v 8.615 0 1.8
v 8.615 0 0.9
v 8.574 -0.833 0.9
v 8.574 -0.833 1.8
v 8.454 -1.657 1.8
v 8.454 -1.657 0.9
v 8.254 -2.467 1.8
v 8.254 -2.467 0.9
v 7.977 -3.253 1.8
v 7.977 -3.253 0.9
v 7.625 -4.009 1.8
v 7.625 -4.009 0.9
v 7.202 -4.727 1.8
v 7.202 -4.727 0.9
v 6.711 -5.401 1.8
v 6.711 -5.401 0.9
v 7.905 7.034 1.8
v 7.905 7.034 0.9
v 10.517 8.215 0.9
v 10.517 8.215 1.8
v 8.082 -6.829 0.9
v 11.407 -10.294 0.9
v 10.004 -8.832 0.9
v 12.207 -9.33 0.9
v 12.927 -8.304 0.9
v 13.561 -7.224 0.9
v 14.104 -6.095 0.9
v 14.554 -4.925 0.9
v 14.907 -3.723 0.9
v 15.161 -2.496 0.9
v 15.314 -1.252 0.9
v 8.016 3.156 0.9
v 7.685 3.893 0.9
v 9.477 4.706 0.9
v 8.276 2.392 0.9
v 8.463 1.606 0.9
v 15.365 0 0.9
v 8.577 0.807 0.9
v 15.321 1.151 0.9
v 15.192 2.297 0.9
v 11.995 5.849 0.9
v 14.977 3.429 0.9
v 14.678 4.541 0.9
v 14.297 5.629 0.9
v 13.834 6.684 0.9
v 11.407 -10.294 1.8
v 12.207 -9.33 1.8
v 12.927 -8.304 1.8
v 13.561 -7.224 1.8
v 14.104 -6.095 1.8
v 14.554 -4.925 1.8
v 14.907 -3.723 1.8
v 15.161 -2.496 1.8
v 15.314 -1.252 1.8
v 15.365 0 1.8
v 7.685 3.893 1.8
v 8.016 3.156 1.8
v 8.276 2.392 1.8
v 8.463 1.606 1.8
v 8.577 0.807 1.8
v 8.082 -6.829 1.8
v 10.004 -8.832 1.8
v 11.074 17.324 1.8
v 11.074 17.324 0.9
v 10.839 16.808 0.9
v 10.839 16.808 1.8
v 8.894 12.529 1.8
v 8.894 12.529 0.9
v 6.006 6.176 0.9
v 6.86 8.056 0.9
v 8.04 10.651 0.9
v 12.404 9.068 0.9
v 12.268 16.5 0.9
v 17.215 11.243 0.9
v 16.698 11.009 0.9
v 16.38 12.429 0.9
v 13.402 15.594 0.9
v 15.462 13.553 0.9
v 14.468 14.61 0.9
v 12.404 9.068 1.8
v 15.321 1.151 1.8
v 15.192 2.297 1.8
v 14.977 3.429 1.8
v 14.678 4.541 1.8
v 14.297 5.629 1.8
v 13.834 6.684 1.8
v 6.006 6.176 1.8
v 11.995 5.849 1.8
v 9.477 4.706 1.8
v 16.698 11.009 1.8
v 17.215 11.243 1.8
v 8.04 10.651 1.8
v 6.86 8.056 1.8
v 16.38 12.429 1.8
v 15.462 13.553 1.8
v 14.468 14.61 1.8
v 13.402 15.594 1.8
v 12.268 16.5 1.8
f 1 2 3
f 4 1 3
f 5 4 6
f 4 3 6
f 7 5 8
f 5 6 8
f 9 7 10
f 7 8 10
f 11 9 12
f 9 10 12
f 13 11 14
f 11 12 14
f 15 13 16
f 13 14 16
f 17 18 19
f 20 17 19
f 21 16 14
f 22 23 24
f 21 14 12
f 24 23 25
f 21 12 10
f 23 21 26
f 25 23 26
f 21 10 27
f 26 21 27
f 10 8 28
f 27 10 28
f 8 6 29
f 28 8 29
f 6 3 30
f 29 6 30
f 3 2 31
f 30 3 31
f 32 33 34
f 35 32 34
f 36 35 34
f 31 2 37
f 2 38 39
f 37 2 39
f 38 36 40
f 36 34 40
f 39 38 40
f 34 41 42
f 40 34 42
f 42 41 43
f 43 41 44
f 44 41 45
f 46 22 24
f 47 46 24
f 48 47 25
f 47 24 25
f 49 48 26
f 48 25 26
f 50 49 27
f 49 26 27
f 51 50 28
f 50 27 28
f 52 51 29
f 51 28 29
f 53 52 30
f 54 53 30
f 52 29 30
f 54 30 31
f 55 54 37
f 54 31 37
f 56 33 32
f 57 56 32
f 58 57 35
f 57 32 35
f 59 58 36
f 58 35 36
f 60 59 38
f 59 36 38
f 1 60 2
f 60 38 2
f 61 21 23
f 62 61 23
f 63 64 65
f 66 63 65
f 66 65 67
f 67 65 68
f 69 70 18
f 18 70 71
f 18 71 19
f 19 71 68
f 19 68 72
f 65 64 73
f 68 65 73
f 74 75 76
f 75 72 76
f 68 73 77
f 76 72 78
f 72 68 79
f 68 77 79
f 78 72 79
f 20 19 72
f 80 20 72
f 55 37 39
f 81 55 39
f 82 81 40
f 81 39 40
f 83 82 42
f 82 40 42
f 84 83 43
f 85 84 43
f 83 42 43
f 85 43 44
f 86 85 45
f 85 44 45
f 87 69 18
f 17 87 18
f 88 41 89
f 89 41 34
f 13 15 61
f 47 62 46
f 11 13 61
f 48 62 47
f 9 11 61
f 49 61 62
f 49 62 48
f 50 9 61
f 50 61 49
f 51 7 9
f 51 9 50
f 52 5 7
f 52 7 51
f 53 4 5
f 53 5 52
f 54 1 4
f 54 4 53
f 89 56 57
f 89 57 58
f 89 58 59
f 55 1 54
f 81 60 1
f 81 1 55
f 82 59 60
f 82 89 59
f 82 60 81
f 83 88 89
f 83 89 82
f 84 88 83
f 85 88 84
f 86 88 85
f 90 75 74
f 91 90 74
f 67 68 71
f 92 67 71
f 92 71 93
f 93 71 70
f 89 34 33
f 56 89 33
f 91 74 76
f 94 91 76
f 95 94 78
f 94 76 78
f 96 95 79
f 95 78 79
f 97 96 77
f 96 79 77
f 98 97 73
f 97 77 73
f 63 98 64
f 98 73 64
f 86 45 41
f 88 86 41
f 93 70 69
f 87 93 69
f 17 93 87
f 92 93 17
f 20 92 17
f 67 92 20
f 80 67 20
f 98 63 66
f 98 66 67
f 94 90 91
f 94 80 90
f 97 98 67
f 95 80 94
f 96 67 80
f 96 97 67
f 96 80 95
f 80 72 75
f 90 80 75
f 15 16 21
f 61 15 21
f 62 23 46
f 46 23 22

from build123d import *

# Parameters (mm, degrees)
F0_R        = 1.5044645314
F1_DEPTH    = 2.7
F2_DEPTH    = 0.9
F3_DEPTH    = 2.7
F4_DEPTH    = 0.9
F5_T1_DEPTH = 2.7
F6_DEPTH    = 0.9


# Not quite as in the source:
# - a fillet or chamfer that OpenCascade refuses, or shapes differently, is made with other operations: its cross-section is extruded or revolved along the edge and cut away or added


with BuildPart() as f1:
    # F0 (on Top) → F1 (new body)
    with BuildSketch(Plane.XY):
        with BuildLine():
            ThreePointArc((-2.9059050305, 19.7877668258), (-18.361479671, -7.928181651), (12.4102011034, -15.6839697964))
            Line((12.4102011034, -15.6839697964), (9.3065271924, -12.2254227754))
            ThreePointArc((9.3065271924, -12.2254227754), (-15.2699304913, -1.7034180964), (6.3836906961, 13.9757255095))
            Line((6.3836906961, 13.9757255095), (8.1864677167, 18.2477874364))
            ThreePointArc((8.1864677167, 18.2477874364), (5.5993809855, 19.2001805351), (2.9059050305, 19.7877668258))
            ThreePointArc((2.9059050305, 19.7877668258), (0, 18.1241204417), (-2.9059050305, 19.7877668258))
        make_face()
        with BuildLine():
            ThreePointArc((6.3836906961, 13.9757255095), (-15.2699304913, -1.7034180964), (9.3065271924, -12.2254227754))
            Line((9.3065271924, -12.2254227754), (7.9527661976, -10.7168731694))
            ThreePointArc((7.9527661976, -10.7168731694), (-13.2749249311, -1.3690247612), (5.5982117915, 12.114366903))
            Line((5.5982117915, 12.114366903), (6.3836906961, 13.9757255095))
        make_face()
        with BuildLine():
            ThreePointArc((5.5982117915, 12.114366903), (-13.2749249311, -1.3690247612), (7.9527661976, -10.7168731694))
            Line((7.9527661976, -10.7168731694), (6.0964799797, -8.6483397626))
            ThreePointArc((6.0964799797, -8.6483397626), (-10.5418803683, -0.9108276969), (4.5227579261, 9.5658512185))
            Line((4.5227579261, 9.5658512185), (5.5982117915, 12.114366903))
        make_face()
        with BuildLine():
            ThreePointArc((4.5227579261, 9.5658512185), (-10.5418803683, -0.9108276969), (6.0964799797, -8.6483397626))
            Line((6.0964799797, -8.6483397626), (4.7718042528, -7.1722010249))
            ThreePointArc((4.7718042528, -7.1722010249), (-8.5947223482, -0.5842355063), (3.7573171653, 7.7519772374))
            Line((3.7573171653, 7.7519772374), (4.5227579261, 9.5658512185))
        make_face()
        with BuildLine():
            ThreePointArc((3.7573171653, 7.7519772374), (-8.5947223482, -0.5842355063), (4.7718042528, -7.1722010249))
            Line((4.7718042528, -7.1722010249), (1.6593857385, -3.7039095455))
            ThreePointArc((1.6593857385, -3.7039095455), (-4.0546444127, 0.1799045205), (1.9809039535, 3.5423899386))
            Line((1.9809039535, 3.5423899386), (3.7573171653, 7.7519772374))
        make_face()
        with BuildLine():
            ThreePointArc((2.9059050305, 19.7877668258), (0, 20), (-2.9059050305, 19.7877668258))
            ThreePointArc((-2.9059050305, 19.7877668258), (0, 18.1241204417), (2.9059050305, 19.7877668258))
        make_face()
        with BuildLine():
            ThreePointArc((-3.157685128, 20.3174125427), (-3.043339046, 20.0471019762), (-2.9059050305, 19.7877668258))
            ThreePointArc((-2.9059050305, 19.7877668258), (0, 20), (2.9059050305, 19.7877668258))
            ThreePointArc((2.9059050305, 19.7877668258), (3.043339046, 20.0471019762), (3.157685128, 20.3174125427))
            ThreePointArc((3.157685128, 20.3174125427), (0, 20.5613284541), (-3.157685128, 20.3174125427))
        make_face()
        with BuildLine():
            ThreePointArc((3.3697074825, 21.4938279241), (-0.5976844127, 24.8101062388), (-3.157685128, 20.3174125427))
            ThreePointArc((-3.157685128, 20.3174125427), (0, 20.5613284541), (3.157685128, 20.3174125427))
            ThreePointArc((3.157685128, 20.3174125427), (3.3162783146, 20.8961435115), (3.3697074825, 21.4938279241))
        make_face()
        with Locations((0, 22.4330537021)):
            Circle(F0_R, mode=Mode.SUBTRACT)
        with BuildLine():
            ThreePointArc((13.8344540426, 6.6843318112), (13.1730545976, 7.9084159596), (12.4036340143, 9.0676498421))
            Line((12.4036340143, 9.0676498421), (10.5172175152, 8.21498609))
            ThreePointArc((10.5172175152, 8.21498609), (11.318131065, 7.0709101194), (11.995098321, 5.8493997121))
            Line((11.995098321, 5.8493997121), (13.8344540426, 6.6843318112))
        make_face()
        with BuildLine():
            ThreePointArc((11.995098321, 5.8493997121), (11.318131065, 7.0709101194), (10.5172175152, 8.21498609))
            Line((10.5172175152, 8.21498609), (7.9045951482, 7.0340759404))
            ThreePointArc((7.9045951482, 7.0340759404), (8.7683299388, 5.9226040621), (9.4768887451, 4.706317935))
            Line((9.4768887451, 4.706317935), (11.995098321, 5.8493997121))
        make_face()
        with BuildLine():
            ThreePointArc((9.4768887451, 4.706317935), (8.7683299388, 5.9226040621), (7.9045951482, 7.0340759404))
            Line((7.9045951482, 7.0340759404), (6.0058132946, 6.1758230253))
            ThreePointArc((6.0058132946, 6.1758230253), (6.9398340598, 5.1038501734), (7.6848114732, 3.8928467719))
            Line((7.6848114732, 3.8928467719), (9.4768887451, 4.706317935))
        make_face()
        with BuildLine():
            Line((6.0058132946, 6.1758230253), (7.9045951482, 7.0340759404))
            ThreePointArc((7.9045951482, 7.0340759404), (7.4001814409, 7.5629467428), (6.8604632985, 8.0557365971))
            Line((6.8604632985, 8.0557365971), (6.0058132946, 6.1758230253))
        make_face()
        with BuildLine():
            ThreePointArc((6.8604632985, 8.0557365971), (5.7414756731, 8.8879866049), (4.5227579261, 9.5658512185))
            Line((4.5227579261, 9.5658512185), (3.7573171653, 7.7519772374))
            ThreePointArc((3.7573171653, 7.7519772374), (4.9447694202, 7.0540654058), (6.0058132946, 6.1758230253))
            Line((6.0058132946, 6.1758230253), (6.8604632985, 8.0557365971))
        make_face()
        with BuildLine():
            ThreePointArc((8.0404414582, 10.6512516579), (6.8584540657, 11.4481207432), (5.5982117915, 12.114366903))
            Line((5.5982117915, 12.114366903), (4.5227579261, 9.5658512185))
            ThreePointArc((4.5227579261, 9.5658512185), (5.7414756731, 8.8879866049), (6.8604632985, 8.0557365971))
            Line((6.8604632985, 8.0557365971), (8.0404414582, 10.6512516579))
        make_face()
        with BuildLine():
            ThreePointArc((8.8939895289, 12.5287413845), (7.6730254156, 13.3115397829), (6.3836906961, 13.9757255095))
            Line((6.3836906961, 13.9757255095), (5.5982117915, 12.114366903))
            ThreePointArc((5.5982117915, 12.114366903), (6.8584540657, 11.4481207432), (8.0404414582, 10.6512516579))
            Line((8.0404414582, 10.6512516579), (8.8939895289, 12.5287413845))
        make_face()
        with BuildLine():
            Line((7.9045951482, 7.0340759404), (10.5172175152, 8.21498609))
            ThreePointArc((10.5172175152, 8.21498609), (9.3584466725, 9.514059943), (8.0404414582, 10.6512516579))
            Line((8.0404414582, 10.6512516579), (6.8604632985, 8.0557365971))
            ThreePointArc((6.8604632985, 8.0557365971), (7.4001814409, 7.5629467428), (7.9045951482, 7.0340759404))
        make_face()
        with BuildLine():
            Line((10.5172175152, 8.21498609), (12.4036340143, 9.0676498421))
            ThreePointArc((12.4036340143, 9.0676498421), (10.7885115198, 10.9398550999), (8.8939895289, 12.5287413845))
            Line((8.8939895289, 12.5287413845), (8.0404414582, 10.6512516579))
            ThreePointArc((8.0404414582, 10.6512516579), (9.3584466725, 9.514059943), (10.5172175152, 8.21498609))
        make_face()
        with BuildLine():
            Line((12.4036340143, 9.0676498421), (16.6976556484, 11.008555575))
            ThreePointArc((16.6976556484, 11.008555575), (14.070563524, 14.2133473227), (10.8394114429, 16.807949297))
            Line((10.8394114429, 16.807949297), (8.8939895289, 12.5287413845))
            ThreePointArc((8.8939895289, 12.5287413845), (10.7885115198, 10.9398550999), (12.4036340143, 9.0676498421))
        make_face()
        with BuildLine():
            ThreePointArc((10.8394114429, 16.807949297), (14.070563524, 14.2133473227), (16.6976556484, 11.008555575))
            Line((16.6976556484, 11.008555575), (17.2154603994, 11.2426042817))
            ThreePointArc((17.2154603994, 11.2426042817), (14.4679762691, 14.6097874889), (11.0741551061, 17.3242984413))
            Line((11.0741551061, 17.3242984413), (10.8394114429, 16.807949297))
        make_face()
    extrude(amount=-F1_DEPTH)

    # F0 (on Top) → F2 (join)
    with BuildSketch(Plane.XY):
        with BuildLine():
            ThreePointArc((-2.9059050305, 19.7877668258), (-18.361479671, -7.928181651), (12.4102011034, -15.6839697964))
            Line((12.4102011034, -15.6839697964), (9.3065271924, -12.2254227754))
            ThreePointArc((9.3065271924, -12.2254227754), (-15.2699304913, -1.7034180964), (6.3836906961, 13.9757255095))
            Line((6.3836906961, 13.9757255095), (8.1864677167, 18.2477874364))
            ThreePointArc((8.1864677167, 18.2477874364), (5.5993809855, 19.2001805351), (2.9059050305, 19.7877668258))
            ThreePointArc((2.9059050305, 19.7877668258), (0, 18.1241204417), (-2.9059050305, 19.7877668258))
        make_face()
        with BuildLine():
            ThreePointArc((6.3836906961, 13.9757255095), (-15.2699304913, -1.7034180964), (9.3065271924, -12.2254227754))
            Line((9.3065271924, -12.2254227754), (7.9527661976, -10.7168731694))
            ThreePointArc((7.9527661976, -10.7168731694), (-13.2749249311, -1.3690247612), (5.5982117915, 12.114366903))
            Line((5.5982117915, 12.114366903), (6.3836906961, 13.9757255095))
        make_face()
        with BuildLine():
            ThreePointArc((4.5227579261, 9.5658512185), (-10.5418803683, -0.9108276969), (6.0964799797, -8.6483397626))
            Line((6.0964799797, -8.6483397626), (4.7718042528, -7.1722010249))
            ThreePointArc((4.7718042528, -7.1722010249), (-8.5947223482, -0.5842355063), (3.7573171653, 7.7519772374))
            Line((3.7573171653, 7.7519772374), (4.5227579261, 9.5658512185))
        make_face()
        with BuildLine():
            ThreePointArc((3.7573171653, 7.7519772374), (-8.5947223482, -0.5842355063), (4.7718042528, -7.1722010249))
            Line((4.7718042528, -7.1722010249), (1.6593857385, -3.7039095455))
            ThreePointArc((1.6593857385, -3.7039095455), (-4.0546444127, 0.1799045205), (1.9809039535, 3.5423899386))
            Line((1.9809039535, 3.5423899386), (3.7573171653, 7.7519772374))
        make_face()
        with BuildLine():
            ThreePointArc((2.9059050305, 19.7877668258), (0, 20), (-2.9059050305, 19.7877668258))
            ThreePointArc((-2.9059050305, 19.7877668258), (0, 18.1241204417), (2.9059050305, 19.7877668258))
        make_face()
    extrude(amount=F2_DEPTH)

    # F0 (on Top) → F3 (join)
    with BuildSketch(Plane.XY):
        with BuildLine():
            Line((6.7113864418, -5.4007291543), (8.0821585416, -6.8293163715))
            ThreePointArc((8.0821585416, -6.8293163715), (9.9367857977, -3.6360881181), (10.5811553619, 0))
            ThreePointArc((10.5811553619, 0), (10.3013902205, 2.4170660555), (9.4768887451, 4.706317935))
            Line((9.4768887451, 4.706317935), (7.6848114732, 3.8928467719))
            ThreePointArc((7.6848114732, 3.8928467719), (8.3788968801, 2.00116727), (8.6145564813, 0))
            ThreePointArc((8.6145564813, 0), (8.1248446428, -2.8631246741), (6.7113864418, -5.4007291543))
        make_face()
        with BuildLine():
            Line((8.0821585416, -6.8293163715), (10.0042554899, -8.8324816906))
            ThreePointArc((10.0042554899, -8.8324816906), (12.4821464921, -4.721639511), (13.3453310458, 0))
            ThreePointArc((13.3453310458, 0), (13.0033922255, 3.0016081275), (11.995098321, 5.8493997121))
            Line((11.995098321, 5.8493997121), (9.4768887451, 4.706317935))
            ThreePointArc((9.4768887451, 4.706317935), (10.3013902205, 2.4170660555), (10.5811553619, 0))
            ThreePointArc((10.5811553619, 0), (9.9367857977, -3.6360881181), (8.0821585416, -6.8293163715))
        make_face()
        with BuildLine():
            Line((10.0042554899, -8.8324816906), (11.4065098197, -10.2938789654))
            ThreePointArc((11.4065098197, -10.2938789654), (14.3410149492, -5.5143177862), (15.3646480734, 0))
            ThreePointArc((15.3646480734, 0), (14.9772148291, 3.4286216448), (13.8344540426, 6.6843318112))
            Line((13.8344540426, 6.6843318112), (11.995098321, 5.8493997121))
            ThreePointArc((11.995098321, 5.8493997121), (13.0033922255, 3.0016081275), (13.3453310458, 0))
            ThreePointArc((13.3453310458, 0), (12.4821464921, -4.721639511), (10.0042554899, -8.8324816906))
        make_face()
        with BuildLine():
            Line((7.9527661976, -10.7168731694), (9.3065271924, -12.2254227754))
            ThreePointArc((9.3065271924, -12.2254227754), (10.4014513861, -11.3085020883), (11.4065098197, -10.2938789654))
            Line((11.4065098197, -10.2938789654), (10.0042554899, -8.8324816906))
            ThreePointArc((10.0042554899, -8.8324816906), (9.0278120152, -9.8283503672), (7.9527661976, -10.7168731694))
        make_face()
        with BuildLine():
            Line((6.0964799797, -8.6483397626), (7.9527661976, -10.7168731694))
            ThreePointArc((7.9527661976, -10.7168731694), (9.0278120152, -9.8283503672), (10.0042554899, -8.8324816906))
            Line((10.0042554899, -8.8324816906), (8.0821585416, -6.8293163715))
            ThreePointArc((8.0821585416, -6.8293163715), (7.1474232492, -7.8022554232), (6.0964799797, -8.6483397626))
        make_face()
        with BuildLine():
            Line((4.7718042528, -7.1722010249), (6.0964799797, -8.6483397626))
            ThreePointArc((6.0964799797, -8.6483397626), (7.1474232492, -7.8022554232), (8.0821585416, -6.8293163715))
            Line((8.0821585416, -6.8293163715), (6.7113864418, -5.4007291543))
            ThreePointArc((6.7113864418, -5.4007291543), (5.8095133427, -6.3608284122), (4.7718042528, -7.1722010249))
        make_face()
    extrude(amount=-F3_DEPTH)

    # F0 (on Top) → F4 (join)
    with BuildSketch(Plane.XY):
        with BuildLine():
            Line((10.0042554899, -8.8324816906), (11.4065098197, -10.2938789654))
            ThreePointArc((11.4065098197, -10.2938789654), (14.3410149492, -5.5143177862), (15.3646480734, 0))
            ThreePointArc((15.3646480734, 0), (14.9772148291, 3.4286216448), (13.8344540426, 6.6843318112))
            Line((13.8344540426, 6.6843318112), (11.995098321, 5.8493997121))
            ThreePointArc((11.995098321, 5.8493997121), (13.0033922255, 3.0016081275), (13.3453310458, 0))
            ThreePointArc((13.3453310458, 0), (12.4821464921, -4.721639511), (10.0042554899, -8.8324816906))
        make_face()
        with BuildLine():
            Line((8.0821585416, -6.8293163715), (10.0042554899, -8.8324816906))
            ThreePointArc((10.0042554899, -8.8324816906), (12.4821464921, -4.721639511), (13.3453310458, 0))
            ThreePointArc((13.3453310458, 0), (13.0033922255, 3.0016081275), (11.995098321, 5.8493997121))
            Line((11.995098321, 5.8493997121), (9.4768887451, 4.706317935))
            ThreePointArc((9.4768887451, 4.706317935), (10.3013902205, 2.4170660555), (10.5811553619, 0))
            ThreePointArc((10.5811553619, 0), (9.9367857977, -3.6360881181), (8.0821585416, -6.8293163715))
        make_face()
        with BuildLine():
            Line((6.7113864418, -5.4007291543), (8.0821585416, -6.8293163715))
            ThreePointArc((8.0821585416, -6.8293163715), (9.9367857977, -3.6360881181), (10.5811553619, 0))
            ThreePointArc((10.5811553619, 0), (10.3013902205, 2.4170660555), (9.4768887451, 4.706317935))
            Line((9.4768887451, 4.706317935), (7.6848114732, 3.8928467719))
            ThreePointArc((7.6848114732, 3.8928467719), (8.3788968801, 2.00116727), (8.6145564813, 0))
            ThreePointArc((8.6145564813, 0), (8.1248446428, -2.8631246741), (6.7113864418, -5.4007291543))
        make_face()
        with BuildLine():
            ThreePointArc((10.8394114429, 16.807949297), (14.070563524, 14.2133473227), (16.6976556484, 11.008555575))
            Line((16.6976556484, 11.008555575), (17.2154603994, 11.2426042817))
            ThreePointArc((17.2154603994, 11.2426042817), (14.4679762691, 14.6097874889), (11.0741551061, 17.3242984413))
            Line((11.0741551061, 17.3242984413), (10.8394114429, 16.807949297))
        make_face()
        with BuildLine():
            Line((6.0058132946, 6.1758230253), (7.9045951482, 7.0340759404))
            ThreePointArc((7.9045951482, 7.0340759404), (7.4001814409, 7.5629467428), (6.8604632985, 8.0557365971))
            Line((6.8604632985, 8.0557365971), (6.0058132946, 6.1758230253))
        make_face()
        with BuildLine():
            Line((7.9045951482, 7.0340759404), (10.5172175152, 8.21498609))
            ThreePointArc((10.5172175152, 8.21498609), (9.3584466725, 9.514059943), (8.0404414582, 10.6512516579))
            Line((8.0404414582, 10.6512516579), (6.8604632985, 8.0557365971))
            ThreePointArc((6.8604632985, 8.0557365971), (7.4001814409, 7.5629467428), (7.9045951482, 7.0340759404))
        make_face()
        with BuildLine():
            Line((10.5172175152, 8.21498609), (12.4036340143, 9.0676498421))
            ThreePointArc((12.4036340143, 9.0676498421), (10.7885115198, 10.9398550999), (8.8939895289, 12.5287413845))
            Line((8.8939895289, 12.5287413845), (8.0404414582, 10.6512516579))
            ThreePointArc((8.0404414582, 10.6512516579), (9.3584466725, 9.514059943), (10.5172175152, 8.21498609))
        make_face()
        with BuildLine():
            Line((12.4036340143, 9.0676498421), (16.6976556484, 11.008555575))
            ThreePointArc((16.6976556484, 11.008555575), (14.070563524, 14.2133473227), (10.8394114429, 16.807949297))
            Line((10.8394114429, 16.807949297), (8.8939895289, 12.5287413845))
            ThreePointArc((8.8939895289, 12.5287413845), (10.7885115198, 10.9398550999), (12.4036340143, 9.0676498421))
        make_face()
    extrude(amount=F4_DEPTH)

    # F5: fillet of radius 3 on 2 edges, made by hand

    # F5_s2 → F5_t1 (join)
    with BuildSketch(Plane.XY.offset(-2.7)):
        with BuildLine():
            ThreePointArc((3.3539587166, 21.8192345075), (4.0340965589, 20.1897997022), (5.5129894146, 19.2251644392))
            ThreePointArc((5.5129894146, 19.2251644392), (4.2188358916, 19.5499724736), (2.9059050305, 19.7877668258))
            ThreePointArc((2.9059050305, 19.7877668258), (3.2906213347, 20.768059539), (3.3539587166, 21.8192345075))
        make_face()
        with BuildLine():
            ThreePointArc((-3.3539587166, 21.8192345075), (-4.0340965589, 20.1897997022), (-5.5129894146, 19.2251644392))
            ThreePointArc((-5.5129894146, 19.2251644392), (-4.2188358916, 19.5499724736), (-2.9059050305, 19.7877668258))
            ThreePointArc((-2.9059050305, 19.7877668258), (-3.2906213347, 20.768059539), (-3.3539587166, 21.8192345075))
        make_face()
    extrude(amount=F5_T1_DEPTH)


with BuildPart() as f6:
    # F6 (new): a face of the model
    f6_faces = [f1.part.faces().sort_by_distance(p)[0] for p in [
        (11.5302934708, -1.5094822973, 0.9),
    ]]
    extrude(f6_faces, amount=F6_DEPTH)


with BuildPart() as f6b:
    # F6#2 (new): a face of the model
    f6_2_faces = [f1.part.faces().sort_by_distance(p)[0] for p in [
        (11.5759648362, 11.7245978836, 0.9),
    ]]
    extrude(f6_2_faces, amount=F6_DEPTH)


solid = Compound([f6.part, f6b.part])
